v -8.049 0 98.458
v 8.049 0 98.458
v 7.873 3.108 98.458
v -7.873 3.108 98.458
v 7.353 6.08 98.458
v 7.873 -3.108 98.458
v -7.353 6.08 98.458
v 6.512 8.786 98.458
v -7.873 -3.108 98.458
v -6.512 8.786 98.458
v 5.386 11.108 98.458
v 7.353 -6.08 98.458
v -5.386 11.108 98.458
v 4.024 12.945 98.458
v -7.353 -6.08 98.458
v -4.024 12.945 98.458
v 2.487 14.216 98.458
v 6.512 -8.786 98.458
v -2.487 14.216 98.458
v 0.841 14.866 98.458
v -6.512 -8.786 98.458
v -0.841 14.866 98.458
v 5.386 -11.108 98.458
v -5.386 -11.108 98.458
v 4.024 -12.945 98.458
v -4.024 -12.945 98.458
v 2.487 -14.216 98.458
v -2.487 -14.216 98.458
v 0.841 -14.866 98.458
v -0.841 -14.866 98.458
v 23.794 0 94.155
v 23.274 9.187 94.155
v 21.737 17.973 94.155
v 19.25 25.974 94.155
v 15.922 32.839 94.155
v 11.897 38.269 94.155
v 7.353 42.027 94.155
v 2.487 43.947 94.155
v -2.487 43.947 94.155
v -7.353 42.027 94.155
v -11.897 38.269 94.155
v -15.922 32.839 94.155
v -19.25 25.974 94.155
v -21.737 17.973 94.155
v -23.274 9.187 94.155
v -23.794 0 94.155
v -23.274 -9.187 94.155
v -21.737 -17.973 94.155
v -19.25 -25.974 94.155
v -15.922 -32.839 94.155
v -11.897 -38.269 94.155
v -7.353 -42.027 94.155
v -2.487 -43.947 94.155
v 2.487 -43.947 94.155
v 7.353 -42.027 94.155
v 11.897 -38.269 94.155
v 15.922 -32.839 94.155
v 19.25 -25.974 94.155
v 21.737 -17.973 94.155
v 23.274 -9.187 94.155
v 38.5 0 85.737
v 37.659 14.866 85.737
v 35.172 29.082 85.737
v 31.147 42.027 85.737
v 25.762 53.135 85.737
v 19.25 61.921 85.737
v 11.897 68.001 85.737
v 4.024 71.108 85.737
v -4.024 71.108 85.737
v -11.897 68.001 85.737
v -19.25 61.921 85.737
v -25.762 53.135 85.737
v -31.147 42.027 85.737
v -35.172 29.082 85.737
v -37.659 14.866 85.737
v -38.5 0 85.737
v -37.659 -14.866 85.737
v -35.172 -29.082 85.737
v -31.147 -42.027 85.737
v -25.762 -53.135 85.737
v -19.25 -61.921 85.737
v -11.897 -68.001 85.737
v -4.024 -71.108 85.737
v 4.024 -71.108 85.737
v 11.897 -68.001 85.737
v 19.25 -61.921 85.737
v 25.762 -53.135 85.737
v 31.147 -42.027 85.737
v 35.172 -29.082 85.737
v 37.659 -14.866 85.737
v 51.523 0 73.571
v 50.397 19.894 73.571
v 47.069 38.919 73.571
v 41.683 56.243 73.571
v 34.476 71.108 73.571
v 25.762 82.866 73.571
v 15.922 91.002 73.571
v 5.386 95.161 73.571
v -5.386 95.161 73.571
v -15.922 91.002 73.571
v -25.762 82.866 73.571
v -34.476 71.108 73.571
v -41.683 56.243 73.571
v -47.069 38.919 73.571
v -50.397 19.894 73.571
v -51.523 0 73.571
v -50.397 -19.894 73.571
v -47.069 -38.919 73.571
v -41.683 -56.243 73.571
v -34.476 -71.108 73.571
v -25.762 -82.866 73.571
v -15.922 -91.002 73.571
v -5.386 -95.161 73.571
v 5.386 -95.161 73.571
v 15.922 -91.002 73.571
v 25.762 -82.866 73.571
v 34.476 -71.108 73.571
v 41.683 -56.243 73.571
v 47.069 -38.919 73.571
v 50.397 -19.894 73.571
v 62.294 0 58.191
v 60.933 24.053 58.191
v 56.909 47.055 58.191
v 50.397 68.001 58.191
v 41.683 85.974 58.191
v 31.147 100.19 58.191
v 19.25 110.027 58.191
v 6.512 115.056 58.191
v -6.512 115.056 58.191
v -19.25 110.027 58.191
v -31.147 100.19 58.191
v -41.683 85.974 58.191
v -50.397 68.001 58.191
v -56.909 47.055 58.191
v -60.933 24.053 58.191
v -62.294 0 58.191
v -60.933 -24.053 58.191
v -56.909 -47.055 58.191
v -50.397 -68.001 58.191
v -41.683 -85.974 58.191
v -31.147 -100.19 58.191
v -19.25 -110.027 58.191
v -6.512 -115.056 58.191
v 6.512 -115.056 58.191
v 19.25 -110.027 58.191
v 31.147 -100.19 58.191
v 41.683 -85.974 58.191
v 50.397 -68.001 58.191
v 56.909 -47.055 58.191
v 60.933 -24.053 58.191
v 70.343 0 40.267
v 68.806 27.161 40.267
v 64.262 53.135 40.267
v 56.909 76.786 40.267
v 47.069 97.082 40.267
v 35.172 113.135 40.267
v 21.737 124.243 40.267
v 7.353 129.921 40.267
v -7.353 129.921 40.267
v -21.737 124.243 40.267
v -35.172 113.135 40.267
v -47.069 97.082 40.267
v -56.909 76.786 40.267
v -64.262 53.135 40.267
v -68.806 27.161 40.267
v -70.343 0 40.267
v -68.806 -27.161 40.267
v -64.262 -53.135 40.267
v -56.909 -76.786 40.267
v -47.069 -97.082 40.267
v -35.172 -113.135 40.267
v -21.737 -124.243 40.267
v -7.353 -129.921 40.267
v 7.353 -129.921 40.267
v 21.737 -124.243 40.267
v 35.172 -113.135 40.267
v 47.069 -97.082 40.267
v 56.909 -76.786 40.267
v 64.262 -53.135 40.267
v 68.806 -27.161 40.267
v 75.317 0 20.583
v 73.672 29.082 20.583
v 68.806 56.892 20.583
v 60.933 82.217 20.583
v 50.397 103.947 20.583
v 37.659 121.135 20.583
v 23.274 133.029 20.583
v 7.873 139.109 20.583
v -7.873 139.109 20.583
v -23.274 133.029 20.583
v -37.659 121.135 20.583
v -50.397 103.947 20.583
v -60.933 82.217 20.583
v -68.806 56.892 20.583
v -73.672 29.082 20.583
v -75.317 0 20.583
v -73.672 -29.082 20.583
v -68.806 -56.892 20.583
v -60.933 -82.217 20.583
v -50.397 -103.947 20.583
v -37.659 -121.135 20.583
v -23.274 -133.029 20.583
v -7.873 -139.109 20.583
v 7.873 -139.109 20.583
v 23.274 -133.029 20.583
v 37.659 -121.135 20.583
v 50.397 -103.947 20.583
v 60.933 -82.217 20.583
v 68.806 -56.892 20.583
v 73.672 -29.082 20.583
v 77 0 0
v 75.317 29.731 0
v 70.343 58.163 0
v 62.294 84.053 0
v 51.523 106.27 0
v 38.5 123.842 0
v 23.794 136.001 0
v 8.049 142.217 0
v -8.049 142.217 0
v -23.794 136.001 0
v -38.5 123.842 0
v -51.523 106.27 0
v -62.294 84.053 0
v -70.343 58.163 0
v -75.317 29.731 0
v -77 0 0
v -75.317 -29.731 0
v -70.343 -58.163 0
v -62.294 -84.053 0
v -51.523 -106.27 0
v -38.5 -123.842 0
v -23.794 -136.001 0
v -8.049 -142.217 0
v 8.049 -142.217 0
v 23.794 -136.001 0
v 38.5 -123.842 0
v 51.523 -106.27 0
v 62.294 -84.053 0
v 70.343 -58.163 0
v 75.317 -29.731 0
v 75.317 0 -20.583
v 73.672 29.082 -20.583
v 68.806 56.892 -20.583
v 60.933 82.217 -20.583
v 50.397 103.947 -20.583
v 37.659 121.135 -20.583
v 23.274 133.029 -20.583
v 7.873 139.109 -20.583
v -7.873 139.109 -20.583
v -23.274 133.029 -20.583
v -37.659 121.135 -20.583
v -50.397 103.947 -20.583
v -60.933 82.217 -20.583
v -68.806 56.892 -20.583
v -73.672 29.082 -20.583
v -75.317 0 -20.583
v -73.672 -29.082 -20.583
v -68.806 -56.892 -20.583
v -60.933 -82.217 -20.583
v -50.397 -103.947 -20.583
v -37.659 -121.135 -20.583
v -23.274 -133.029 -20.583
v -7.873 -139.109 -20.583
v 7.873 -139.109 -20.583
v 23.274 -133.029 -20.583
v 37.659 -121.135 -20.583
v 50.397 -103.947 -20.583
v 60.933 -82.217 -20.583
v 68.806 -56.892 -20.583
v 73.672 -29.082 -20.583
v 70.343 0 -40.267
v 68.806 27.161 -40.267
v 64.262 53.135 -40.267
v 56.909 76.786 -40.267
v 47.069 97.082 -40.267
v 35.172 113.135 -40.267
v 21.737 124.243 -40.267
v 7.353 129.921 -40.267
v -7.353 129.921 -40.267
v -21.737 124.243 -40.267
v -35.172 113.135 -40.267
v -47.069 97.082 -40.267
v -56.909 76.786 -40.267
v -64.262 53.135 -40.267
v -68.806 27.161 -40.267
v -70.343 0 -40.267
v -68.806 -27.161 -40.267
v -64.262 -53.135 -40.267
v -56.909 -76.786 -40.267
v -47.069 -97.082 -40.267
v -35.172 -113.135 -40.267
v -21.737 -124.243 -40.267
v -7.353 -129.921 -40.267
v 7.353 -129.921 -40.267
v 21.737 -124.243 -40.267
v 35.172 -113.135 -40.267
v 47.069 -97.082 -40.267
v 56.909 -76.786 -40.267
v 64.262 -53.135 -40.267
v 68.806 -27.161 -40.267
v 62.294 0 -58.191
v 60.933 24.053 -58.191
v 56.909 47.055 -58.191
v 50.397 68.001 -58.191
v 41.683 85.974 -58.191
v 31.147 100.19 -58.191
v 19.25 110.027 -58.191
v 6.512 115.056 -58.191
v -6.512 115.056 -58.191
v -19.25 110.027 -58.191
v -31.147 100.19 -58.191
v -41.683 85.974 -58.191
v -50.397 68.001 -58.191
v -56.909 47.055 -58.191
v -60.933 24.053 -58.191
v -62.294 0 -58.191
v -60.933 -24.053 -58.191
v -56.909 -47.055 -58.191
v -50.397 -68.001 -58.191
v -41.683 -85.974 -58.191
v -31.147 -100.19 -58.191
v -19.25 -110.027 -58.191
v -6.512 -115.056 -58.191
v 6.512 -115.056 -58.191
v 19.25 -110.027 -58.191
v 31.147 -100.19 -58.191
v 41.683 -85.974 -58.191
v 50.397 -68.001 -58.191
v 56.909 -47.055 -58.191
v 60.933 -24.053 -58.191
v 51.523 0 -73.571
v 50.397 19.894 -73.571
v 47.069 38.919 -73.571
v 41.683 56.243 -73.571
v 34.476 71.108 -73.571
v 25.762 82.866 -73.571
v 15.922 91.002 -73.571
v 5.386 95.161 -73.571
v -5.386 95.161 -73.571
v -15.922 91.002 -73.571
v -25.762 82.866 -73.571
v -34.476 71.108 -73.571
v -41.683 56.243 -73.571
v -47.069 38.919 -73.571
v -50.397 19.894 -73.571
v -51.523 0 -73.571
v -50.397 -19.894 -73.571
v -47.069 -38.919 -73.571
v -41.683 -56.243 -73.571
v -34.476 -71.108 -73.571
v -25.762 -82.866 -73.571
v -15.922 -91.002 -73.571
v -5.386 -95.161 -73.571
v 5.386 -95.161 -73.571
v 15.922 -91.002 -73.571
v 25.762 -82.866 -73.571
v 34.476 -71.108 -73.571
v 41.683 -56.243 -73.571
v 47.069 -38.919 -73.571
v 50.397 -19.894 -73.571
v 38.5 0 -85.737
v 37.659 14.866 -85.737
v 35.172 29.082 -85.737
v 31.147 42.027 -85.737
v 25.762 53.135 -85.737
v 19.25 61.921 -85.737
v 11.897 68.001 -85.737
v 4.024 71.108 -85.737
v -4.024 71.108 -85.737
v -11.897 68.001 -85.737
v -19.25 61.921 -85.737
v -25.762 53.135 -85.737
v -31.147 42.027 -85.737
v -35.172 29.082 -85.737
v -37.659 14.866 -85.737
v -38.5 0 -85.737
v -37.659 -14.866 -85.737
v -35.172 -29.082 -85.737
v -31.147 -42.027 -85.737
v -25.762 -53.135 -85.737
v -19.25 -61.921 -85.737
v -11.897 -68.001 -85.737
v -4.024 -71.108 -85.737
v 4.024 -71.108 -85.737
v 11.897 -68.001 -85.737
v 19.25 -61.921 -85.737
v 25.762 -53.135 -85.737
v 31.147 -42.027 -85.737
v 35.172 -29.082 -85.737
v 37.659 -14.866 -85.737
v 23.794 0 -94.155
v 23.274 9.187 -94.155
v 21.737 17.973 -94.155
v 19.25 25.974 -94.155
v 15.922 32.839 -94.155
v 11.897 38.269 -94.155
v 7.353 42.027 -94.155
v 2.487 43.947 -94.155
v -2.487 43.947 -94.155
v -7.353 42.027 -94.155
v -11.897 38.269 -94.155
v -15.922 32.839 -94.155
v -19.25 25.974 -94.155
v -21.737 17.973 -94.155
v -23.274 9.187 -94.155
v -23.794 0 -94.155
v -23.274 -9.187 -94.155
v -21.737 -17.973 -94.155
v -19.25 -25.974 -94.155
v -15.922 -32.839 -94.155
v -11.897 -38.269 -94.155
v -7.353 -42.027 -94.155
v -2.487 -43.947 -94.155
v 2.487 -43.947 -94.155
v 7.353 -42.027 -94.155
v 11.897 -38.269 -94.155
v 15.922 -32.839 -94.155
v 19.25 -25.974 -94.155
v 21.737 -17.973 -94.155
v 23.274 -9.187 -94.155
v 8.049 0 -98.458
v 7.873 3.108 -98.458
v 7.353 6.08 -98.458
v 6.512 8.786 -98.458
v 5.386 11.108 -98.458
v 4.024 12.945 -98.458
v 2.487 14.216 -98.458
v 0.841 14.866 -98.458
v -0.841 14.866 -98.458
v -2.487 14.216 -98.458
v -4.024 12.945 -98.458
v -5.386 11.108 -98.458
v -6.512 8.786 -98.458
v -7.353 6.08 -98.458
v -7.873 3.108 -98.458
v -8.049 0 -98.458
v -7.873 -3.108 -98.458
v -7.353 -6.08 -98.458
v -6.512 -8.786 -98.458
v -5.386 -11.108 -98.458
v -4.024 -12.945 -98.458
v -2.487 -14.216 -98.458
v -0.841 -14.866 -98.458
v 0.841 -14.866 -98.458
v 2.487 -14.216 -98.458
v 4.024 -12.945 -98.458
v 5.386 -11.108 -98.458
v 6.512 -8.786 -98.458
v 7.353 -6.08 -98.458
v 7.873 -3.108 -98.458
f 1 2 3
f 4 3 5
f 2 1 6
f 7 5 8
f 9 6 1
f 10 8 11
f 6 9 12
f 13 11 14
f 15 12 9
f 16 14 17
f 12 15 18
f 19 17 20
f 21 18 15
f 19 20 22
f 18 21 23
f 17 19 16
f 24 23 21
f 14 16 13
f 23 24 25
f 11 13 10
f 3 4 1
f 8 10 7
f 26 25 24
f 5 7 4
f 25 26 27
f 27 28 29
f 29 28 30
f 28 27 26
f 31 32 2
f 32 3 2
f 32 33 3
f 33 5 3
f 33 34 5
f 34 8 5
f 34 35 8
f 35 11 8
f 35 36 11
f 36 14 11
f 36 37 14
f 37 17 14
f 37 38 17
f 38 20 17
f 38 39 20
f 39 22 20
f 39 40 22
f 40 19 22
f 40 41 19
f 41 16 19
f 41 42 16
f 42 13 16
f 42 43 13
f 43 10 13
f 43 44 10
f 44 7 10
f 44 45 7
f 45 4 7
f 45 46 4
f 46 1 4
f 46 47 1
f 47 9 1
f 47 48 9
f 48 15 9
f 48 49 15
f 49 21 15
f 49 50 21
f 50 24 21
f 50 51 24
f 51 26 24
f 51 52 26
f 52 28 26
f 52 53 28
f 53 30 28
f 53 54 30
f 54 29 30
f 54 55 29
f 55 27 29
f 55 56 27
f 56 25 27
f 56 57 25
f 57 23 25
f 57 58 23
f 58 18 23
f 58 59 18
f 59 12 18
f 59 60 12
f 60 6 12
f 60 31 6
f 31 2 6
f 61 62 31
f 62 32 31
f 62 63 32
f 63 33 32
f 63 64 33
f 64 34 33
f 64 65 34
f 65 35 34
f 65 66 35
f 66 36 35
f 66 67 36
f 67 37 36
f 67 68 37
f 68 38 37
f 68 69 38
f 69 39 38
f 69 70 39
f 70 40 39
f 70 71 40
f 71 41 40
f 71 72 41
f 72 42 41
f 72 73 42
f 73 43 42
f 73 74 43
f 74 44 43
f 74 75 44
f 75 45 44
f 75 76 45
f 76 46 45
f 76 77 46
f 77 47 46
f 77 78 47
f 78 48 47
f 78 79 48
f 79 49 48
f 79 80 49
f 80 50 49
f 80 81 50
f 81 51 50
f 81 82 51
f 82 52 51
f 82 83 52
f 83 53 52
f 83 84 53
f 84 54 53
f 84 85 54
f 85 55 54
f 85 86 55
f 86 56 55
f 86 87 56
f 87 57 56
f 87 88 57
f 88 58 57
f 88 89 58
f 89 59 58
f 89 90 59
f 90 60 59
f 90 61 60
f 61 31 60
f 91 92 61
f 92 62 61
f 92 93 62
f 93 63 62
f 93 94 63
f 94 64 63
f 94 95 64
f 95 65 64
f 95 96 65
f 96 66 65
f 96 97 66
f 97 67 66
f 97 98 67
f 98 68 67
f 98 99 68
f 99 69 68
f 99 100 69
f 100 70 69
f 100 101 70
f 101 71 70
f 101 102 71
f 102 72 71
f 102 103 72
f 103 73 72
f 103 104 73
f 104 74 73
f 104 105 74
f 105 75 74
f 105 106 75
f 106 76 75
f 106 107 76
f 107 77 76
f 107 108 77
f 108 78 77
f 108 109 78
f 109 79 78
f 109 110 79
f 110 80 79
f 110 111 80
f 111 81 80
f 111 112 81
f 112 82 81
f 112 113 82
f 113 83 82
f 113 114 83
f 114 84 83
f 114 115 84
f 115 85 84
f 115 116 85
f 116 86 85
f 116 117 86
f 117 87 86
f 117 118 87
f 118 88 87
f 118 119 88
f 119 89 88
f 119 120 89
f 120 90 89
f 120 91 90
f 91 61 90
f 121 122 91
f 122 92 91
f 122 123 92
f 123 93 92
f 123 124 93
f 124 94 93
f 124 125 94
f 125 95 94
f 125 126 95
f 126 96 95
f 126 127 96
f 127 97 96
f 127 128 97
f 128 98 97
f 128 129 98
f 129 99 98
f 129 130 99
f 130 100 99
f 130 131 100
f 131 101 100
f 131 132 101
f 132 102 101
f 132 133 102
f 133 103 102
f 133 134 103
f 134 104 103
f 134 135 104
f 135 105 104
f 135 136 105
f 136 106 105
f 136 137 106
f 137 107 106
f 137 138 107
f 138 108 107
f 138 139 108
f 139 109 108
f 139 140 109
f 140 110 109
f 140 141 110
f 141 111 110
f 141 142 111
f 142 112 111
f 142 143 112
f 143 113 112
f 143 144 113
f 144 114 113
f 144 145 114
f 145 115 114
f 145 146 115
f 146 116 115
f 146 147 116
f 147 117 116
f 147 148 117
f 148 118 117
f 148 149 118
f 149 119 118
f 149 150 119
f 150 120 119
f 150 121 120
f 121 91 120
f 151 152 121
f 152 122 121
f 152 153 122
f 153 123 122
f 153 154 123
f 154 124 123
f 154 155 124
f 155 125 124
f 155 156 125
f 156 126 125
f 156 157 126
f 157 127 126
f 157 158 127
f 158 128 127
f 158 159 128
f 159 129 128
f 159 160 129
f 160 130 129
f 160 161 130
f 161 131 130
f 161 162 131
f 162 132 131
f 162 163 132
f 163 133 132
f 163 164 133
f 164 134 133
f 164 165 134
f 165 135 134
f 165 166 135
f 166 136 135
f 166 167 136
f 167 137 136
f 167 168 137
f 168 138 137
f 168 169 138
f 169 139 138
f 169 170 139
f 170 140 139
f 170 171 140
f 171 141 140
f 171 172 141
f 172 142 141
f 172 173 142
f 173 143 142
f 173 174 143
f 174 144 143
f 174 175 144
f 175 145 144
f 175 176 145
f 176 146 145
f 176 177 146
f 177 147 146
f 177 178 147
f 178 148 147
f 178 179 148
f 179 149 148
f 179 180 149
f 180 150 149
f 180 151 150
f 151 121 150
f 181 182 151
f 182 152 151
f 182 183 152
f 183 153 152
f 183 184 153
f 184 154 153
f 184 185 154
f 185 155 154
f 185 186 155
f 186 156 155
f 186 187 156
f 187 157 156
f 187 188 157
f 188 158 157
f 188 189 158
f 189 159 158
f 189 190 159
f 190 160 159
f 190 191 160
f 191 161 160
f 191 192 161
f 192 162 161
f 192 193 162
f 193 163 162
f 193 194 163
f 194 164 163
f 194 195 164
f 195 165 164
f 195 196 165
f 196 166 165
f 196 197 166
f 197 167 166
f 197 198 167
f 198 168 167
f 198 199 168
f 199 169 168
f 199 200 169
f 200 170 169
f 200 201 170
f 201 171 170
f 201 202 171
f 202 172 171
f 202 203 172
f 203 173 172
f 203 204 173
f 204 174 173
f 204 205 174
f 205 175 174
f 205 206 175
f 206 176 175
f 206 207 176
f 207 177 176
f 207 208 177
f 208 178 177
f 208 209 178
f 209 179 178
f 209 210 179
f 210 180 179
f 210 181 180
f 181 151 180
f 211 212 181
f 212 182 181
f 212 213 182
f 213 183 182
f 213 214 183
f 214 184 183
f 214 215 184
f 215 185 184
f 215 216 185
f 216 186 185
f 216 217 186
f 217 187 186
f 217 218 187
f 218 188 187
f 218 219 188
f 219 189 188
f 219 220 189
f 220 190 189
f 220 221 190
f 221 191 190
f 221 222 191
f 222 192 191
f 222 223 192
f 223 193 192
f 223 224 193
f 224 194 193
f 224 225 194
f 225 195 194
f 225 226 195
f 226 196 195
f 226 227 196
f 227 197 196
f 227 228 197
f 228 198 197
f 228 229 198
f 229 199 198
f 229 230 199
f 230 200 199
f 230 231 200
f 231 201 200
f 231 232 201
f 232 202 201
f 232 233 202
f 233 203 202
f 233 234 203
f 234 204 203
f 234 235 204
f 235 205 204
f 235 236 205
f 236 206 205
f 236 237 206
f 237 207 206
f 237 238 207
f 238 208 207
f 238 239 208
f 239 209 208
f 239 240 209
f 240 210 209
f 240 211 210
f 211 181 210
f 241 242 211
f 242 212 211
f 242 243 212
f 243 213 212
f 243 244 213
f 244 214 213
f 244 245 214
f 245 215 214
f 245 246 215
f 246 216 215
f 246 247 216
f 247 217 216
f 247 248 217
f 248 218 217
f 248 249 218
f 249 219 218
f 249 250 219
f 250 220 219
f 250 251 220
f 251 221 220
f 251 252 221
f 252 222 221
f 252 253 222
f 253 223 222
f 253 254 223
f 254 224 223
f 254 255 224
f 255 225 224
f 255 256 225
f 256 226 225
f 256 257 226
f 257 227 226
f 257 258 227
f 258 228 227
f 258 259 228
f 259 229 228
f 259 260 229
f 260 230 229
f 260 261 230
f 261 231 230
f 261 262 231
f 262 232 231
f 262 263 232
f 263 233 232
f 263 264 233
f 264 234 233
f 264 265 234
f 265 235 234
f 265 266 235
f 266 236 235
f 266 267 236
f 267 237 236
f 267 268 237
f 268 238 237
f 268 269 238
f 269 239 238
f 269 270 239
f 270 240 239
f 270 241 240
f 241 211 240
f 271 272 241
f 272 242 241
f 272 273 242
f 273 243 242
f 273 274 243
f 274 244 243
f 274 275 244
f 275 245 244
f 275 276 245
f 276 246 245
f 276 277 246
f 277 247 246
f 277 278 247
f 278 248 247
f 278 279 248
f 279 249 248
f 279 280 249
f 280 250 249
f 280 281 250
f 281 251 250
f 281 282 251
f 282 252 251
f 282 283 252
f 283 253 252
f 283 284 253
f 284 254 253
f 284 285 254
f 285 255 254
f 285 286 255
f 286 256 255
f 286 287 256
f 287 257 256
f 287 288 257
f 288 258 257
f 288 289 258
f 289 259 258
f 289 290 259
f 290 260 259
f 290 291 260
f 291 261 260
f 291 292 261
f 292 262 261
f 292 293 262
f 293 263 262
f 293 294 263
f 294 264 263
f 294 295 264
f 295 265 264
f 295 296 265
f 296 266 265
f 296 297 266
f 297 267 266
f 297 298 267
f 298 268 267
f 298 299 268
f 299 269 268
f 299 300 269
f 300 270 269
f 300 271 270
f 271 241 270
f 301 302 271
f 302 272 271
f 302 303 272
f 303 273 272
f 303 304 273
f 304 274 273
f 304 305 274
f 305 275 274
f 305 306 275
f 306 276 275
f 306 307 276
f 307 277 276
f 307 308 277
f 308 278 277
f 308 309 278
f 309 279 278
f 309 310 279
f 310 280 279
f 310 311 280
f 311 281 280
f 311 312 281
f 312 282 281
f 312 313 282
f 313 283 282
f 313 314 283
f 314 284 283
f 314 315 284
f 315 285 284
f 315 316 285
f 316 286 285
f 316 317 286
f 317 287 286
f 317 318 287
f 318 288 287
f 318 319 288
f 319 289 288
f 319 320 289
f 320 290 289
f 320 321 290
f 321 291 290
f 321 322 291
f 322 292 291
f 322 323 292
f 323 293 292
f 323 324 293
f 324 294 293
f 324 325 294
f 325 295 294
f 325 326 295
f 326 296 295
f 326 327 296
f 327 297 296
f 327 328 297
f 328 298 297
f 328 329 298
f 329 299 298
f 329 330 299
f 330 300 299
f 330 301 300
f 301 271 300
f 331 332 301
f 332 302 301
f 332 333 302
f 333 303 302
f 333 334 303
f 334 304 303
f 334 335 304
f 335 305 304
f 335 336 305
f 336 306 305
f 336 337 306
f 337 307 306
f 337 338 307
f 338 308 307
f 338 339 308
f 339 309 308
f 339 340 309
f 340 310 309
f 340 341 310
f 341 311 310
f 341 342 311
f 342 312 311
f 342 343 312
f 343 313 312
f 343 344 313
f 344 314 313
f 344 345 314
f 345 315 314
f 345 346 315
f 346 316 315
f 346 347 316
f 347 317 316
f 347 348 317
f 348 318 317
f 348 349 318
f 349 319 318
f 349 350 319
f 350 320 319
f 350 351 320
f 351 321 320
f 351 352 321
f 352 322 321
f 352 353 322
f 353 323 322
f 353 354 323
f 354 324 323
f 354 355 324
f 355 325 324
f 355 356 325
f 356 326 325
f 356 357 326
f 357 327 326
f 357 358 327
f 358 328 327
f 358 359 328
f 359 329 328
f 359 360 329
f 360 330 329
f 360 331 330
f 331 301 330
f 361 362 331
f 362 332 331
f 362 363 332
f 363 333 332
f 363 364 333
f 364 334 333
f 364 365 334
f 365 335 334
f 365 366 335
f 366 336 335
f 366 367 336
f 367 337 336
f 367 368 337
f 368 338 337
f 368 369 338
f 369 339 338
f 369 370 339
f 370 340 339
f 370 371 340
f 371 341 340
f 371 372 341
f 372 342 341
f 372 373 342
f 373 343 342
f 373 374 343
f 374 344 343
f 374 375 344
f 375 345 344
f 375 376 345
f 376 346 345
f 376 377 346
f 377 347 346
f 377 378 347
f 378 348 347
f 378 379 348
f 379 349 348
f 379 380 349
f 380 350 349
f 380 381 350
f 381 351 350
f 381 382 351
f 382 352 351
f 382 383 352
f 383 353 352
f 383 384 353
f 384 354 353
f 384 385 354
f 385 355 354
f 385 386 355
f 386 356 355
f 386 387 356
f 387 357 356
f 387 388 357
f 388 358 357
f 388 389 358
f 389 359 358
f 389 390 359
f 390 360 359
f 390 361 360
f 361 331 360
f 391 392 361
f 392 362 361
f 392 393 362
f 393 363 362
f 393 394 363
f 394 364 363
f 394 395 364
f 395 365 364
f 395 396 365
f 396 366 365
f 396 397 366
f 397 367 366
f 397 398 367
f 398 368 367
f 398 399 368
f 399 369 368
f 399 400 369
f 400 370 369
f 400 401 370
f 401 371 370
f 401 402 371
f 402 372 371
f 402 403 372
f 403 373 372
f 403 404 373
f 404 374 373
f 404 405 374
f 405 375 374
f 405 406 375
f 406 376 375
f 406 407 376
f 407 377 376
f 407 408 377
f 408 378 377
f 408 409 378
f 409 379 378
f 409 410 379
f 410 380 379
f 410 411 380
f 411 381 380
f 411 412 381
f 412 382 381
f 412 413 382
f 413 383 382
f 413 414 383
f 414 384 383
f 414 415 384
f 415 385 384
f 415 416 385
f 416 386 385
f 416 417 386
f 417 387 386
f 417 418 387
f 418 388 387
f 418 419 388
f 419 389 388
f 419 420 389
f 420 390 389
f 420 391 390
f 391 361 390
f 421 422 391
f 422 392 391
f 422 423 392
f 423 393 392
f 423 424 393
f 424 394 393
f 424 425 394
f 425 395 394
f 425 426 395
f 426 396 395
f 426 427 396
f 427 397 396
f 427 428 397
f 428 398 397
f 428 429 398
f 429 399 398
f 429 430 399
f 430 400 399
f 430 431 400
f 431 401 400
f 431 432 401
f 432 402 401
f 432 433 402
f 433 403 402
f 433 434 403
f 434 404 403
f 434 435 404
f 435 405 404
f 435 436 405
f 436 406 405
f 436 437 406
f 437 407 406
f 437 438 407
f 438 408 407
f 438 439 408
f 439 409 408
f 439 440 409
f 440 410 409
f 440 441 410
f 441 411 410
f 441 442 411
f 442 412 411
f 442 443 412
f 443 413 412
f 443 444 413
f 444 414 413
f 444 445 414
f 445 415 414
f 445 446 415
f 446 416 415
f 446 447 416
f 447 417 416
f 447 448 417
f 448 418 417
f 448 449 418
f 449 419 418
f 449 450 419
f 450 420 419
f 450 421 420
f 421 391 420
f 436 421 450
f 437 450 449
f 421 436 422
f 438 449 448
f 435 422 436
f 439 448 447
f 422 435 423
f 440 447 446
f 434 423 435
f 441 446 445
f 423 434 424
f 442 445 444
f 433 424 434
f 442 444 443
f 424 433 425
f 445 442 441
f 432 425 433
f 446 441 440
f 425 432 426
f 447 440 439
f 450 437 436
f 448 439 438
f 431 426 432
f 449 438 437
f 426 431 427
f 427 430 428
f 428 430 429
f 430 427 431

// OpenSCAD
// Generated by SolidPython 1.0.1 on 2020-07-29 00:46:47


scale(v = [7, 13, 9]) {
	sphere(r = 11);
}
/***********************************************
*********      SolidPython code:      **********
************************************************
 
# import packages: SolidPython
from solid import *
from solid.utils import *
from itertools import chain, combinations, permutations


class Resize:

    def __init__(self, scad_file):
        self.scad_file = scad_file
        #self.scad_file = import_scad(scad_file)
        # cone/cylinder param:
        self.r1 = 0
        self.r2 = 0
        self.h = 0
        # rectangular prism param:
        self.w = 0
        self.l = 0
        # ellipse param:
        self.r = 0

    # import OpenScad code (file name corresponds to shape)


    # classify shape + parameters
    def assign(self, param1, param2, param3):
        if self.scad_file == 'cone.scad':
            self.r1 = param1
            self.r2 = param2
            self.h = param3
        elif self.scad_file == 'cylinder.scad':
            self.r1 = param1
            self.r2 = param2
            self.h = param3
        elif self.scad_file == 'rectangularPrism.scad':
            self.h = param1
            self.l = param2
            self.w = param3
        else:
            self.r = param1
            self.h = param2

    # resize parameters
    def iterate(self):
        x = range(3, 20, 2)
        i = 1
        if self.scad_file == 'cone.scad':
            tempList = list(permutations(x, 2))
            for temp in tempList:
                param1 = temp[0]
                param2 = temp[1]
                filepath = 'produced_scad_files/' + 'cone' + str(param1) + '_' + str(param2) + '_' + '.scad'
                scad_render_to_file(cylinder(h=param1, r1=param2, r2=0), filepath)

        elif self.scad_file == 'cylinder.scad':
            tempList = list(permutations(x, 3))
            for temp in tempList:
                param1 = temp[0]
                param2 = temp[1]
                filepath = 'produced_scad_files/' + 'cylinder' + str(param1) + '_' + str(param2) + '_' + '.scad'
                scad_render_to_file(cylinder(h=param1, r1=param2, r2=param2), filepath)

        elif self.scad_file == 'rectangularPrism.scad':
            tempList = list(permutations(x, 3))
            for temp in tempList:
                param1 = temp[0]
                param2 = temp[1]
                param3 = temp[2]
                filepath = 'produced_scad_files/' + 'rectangularPrism' + str(param1) + '_' + str(param2) + '_' + str(
                    param3) + '.scad'
                scad_render_to_file(cube(size=(param1, param2, param3)), filepath)

        elif self.scad_file == 'ellipse.scad':
            tempList = list(permutations(x, 4))
            for temp in tempList:
                param1 = temp[0]
                param2 = temp[1]
                param3 = temp[2]
                param4 = temp[3]
                filepath = 'produced_scad_files/' + 'ellipse' + str(param1) + '_' + str(param2) + '_' + str(param3) + '_' + str(param4) + '.scad'
                scad_render_to_file(scale([param1, param2, param3])(sphere(r=param4)), filepath)

    def render_to_scadfile(self):
        scad_render_to_file(scad, 'example.scad') 
 
************************************************/
